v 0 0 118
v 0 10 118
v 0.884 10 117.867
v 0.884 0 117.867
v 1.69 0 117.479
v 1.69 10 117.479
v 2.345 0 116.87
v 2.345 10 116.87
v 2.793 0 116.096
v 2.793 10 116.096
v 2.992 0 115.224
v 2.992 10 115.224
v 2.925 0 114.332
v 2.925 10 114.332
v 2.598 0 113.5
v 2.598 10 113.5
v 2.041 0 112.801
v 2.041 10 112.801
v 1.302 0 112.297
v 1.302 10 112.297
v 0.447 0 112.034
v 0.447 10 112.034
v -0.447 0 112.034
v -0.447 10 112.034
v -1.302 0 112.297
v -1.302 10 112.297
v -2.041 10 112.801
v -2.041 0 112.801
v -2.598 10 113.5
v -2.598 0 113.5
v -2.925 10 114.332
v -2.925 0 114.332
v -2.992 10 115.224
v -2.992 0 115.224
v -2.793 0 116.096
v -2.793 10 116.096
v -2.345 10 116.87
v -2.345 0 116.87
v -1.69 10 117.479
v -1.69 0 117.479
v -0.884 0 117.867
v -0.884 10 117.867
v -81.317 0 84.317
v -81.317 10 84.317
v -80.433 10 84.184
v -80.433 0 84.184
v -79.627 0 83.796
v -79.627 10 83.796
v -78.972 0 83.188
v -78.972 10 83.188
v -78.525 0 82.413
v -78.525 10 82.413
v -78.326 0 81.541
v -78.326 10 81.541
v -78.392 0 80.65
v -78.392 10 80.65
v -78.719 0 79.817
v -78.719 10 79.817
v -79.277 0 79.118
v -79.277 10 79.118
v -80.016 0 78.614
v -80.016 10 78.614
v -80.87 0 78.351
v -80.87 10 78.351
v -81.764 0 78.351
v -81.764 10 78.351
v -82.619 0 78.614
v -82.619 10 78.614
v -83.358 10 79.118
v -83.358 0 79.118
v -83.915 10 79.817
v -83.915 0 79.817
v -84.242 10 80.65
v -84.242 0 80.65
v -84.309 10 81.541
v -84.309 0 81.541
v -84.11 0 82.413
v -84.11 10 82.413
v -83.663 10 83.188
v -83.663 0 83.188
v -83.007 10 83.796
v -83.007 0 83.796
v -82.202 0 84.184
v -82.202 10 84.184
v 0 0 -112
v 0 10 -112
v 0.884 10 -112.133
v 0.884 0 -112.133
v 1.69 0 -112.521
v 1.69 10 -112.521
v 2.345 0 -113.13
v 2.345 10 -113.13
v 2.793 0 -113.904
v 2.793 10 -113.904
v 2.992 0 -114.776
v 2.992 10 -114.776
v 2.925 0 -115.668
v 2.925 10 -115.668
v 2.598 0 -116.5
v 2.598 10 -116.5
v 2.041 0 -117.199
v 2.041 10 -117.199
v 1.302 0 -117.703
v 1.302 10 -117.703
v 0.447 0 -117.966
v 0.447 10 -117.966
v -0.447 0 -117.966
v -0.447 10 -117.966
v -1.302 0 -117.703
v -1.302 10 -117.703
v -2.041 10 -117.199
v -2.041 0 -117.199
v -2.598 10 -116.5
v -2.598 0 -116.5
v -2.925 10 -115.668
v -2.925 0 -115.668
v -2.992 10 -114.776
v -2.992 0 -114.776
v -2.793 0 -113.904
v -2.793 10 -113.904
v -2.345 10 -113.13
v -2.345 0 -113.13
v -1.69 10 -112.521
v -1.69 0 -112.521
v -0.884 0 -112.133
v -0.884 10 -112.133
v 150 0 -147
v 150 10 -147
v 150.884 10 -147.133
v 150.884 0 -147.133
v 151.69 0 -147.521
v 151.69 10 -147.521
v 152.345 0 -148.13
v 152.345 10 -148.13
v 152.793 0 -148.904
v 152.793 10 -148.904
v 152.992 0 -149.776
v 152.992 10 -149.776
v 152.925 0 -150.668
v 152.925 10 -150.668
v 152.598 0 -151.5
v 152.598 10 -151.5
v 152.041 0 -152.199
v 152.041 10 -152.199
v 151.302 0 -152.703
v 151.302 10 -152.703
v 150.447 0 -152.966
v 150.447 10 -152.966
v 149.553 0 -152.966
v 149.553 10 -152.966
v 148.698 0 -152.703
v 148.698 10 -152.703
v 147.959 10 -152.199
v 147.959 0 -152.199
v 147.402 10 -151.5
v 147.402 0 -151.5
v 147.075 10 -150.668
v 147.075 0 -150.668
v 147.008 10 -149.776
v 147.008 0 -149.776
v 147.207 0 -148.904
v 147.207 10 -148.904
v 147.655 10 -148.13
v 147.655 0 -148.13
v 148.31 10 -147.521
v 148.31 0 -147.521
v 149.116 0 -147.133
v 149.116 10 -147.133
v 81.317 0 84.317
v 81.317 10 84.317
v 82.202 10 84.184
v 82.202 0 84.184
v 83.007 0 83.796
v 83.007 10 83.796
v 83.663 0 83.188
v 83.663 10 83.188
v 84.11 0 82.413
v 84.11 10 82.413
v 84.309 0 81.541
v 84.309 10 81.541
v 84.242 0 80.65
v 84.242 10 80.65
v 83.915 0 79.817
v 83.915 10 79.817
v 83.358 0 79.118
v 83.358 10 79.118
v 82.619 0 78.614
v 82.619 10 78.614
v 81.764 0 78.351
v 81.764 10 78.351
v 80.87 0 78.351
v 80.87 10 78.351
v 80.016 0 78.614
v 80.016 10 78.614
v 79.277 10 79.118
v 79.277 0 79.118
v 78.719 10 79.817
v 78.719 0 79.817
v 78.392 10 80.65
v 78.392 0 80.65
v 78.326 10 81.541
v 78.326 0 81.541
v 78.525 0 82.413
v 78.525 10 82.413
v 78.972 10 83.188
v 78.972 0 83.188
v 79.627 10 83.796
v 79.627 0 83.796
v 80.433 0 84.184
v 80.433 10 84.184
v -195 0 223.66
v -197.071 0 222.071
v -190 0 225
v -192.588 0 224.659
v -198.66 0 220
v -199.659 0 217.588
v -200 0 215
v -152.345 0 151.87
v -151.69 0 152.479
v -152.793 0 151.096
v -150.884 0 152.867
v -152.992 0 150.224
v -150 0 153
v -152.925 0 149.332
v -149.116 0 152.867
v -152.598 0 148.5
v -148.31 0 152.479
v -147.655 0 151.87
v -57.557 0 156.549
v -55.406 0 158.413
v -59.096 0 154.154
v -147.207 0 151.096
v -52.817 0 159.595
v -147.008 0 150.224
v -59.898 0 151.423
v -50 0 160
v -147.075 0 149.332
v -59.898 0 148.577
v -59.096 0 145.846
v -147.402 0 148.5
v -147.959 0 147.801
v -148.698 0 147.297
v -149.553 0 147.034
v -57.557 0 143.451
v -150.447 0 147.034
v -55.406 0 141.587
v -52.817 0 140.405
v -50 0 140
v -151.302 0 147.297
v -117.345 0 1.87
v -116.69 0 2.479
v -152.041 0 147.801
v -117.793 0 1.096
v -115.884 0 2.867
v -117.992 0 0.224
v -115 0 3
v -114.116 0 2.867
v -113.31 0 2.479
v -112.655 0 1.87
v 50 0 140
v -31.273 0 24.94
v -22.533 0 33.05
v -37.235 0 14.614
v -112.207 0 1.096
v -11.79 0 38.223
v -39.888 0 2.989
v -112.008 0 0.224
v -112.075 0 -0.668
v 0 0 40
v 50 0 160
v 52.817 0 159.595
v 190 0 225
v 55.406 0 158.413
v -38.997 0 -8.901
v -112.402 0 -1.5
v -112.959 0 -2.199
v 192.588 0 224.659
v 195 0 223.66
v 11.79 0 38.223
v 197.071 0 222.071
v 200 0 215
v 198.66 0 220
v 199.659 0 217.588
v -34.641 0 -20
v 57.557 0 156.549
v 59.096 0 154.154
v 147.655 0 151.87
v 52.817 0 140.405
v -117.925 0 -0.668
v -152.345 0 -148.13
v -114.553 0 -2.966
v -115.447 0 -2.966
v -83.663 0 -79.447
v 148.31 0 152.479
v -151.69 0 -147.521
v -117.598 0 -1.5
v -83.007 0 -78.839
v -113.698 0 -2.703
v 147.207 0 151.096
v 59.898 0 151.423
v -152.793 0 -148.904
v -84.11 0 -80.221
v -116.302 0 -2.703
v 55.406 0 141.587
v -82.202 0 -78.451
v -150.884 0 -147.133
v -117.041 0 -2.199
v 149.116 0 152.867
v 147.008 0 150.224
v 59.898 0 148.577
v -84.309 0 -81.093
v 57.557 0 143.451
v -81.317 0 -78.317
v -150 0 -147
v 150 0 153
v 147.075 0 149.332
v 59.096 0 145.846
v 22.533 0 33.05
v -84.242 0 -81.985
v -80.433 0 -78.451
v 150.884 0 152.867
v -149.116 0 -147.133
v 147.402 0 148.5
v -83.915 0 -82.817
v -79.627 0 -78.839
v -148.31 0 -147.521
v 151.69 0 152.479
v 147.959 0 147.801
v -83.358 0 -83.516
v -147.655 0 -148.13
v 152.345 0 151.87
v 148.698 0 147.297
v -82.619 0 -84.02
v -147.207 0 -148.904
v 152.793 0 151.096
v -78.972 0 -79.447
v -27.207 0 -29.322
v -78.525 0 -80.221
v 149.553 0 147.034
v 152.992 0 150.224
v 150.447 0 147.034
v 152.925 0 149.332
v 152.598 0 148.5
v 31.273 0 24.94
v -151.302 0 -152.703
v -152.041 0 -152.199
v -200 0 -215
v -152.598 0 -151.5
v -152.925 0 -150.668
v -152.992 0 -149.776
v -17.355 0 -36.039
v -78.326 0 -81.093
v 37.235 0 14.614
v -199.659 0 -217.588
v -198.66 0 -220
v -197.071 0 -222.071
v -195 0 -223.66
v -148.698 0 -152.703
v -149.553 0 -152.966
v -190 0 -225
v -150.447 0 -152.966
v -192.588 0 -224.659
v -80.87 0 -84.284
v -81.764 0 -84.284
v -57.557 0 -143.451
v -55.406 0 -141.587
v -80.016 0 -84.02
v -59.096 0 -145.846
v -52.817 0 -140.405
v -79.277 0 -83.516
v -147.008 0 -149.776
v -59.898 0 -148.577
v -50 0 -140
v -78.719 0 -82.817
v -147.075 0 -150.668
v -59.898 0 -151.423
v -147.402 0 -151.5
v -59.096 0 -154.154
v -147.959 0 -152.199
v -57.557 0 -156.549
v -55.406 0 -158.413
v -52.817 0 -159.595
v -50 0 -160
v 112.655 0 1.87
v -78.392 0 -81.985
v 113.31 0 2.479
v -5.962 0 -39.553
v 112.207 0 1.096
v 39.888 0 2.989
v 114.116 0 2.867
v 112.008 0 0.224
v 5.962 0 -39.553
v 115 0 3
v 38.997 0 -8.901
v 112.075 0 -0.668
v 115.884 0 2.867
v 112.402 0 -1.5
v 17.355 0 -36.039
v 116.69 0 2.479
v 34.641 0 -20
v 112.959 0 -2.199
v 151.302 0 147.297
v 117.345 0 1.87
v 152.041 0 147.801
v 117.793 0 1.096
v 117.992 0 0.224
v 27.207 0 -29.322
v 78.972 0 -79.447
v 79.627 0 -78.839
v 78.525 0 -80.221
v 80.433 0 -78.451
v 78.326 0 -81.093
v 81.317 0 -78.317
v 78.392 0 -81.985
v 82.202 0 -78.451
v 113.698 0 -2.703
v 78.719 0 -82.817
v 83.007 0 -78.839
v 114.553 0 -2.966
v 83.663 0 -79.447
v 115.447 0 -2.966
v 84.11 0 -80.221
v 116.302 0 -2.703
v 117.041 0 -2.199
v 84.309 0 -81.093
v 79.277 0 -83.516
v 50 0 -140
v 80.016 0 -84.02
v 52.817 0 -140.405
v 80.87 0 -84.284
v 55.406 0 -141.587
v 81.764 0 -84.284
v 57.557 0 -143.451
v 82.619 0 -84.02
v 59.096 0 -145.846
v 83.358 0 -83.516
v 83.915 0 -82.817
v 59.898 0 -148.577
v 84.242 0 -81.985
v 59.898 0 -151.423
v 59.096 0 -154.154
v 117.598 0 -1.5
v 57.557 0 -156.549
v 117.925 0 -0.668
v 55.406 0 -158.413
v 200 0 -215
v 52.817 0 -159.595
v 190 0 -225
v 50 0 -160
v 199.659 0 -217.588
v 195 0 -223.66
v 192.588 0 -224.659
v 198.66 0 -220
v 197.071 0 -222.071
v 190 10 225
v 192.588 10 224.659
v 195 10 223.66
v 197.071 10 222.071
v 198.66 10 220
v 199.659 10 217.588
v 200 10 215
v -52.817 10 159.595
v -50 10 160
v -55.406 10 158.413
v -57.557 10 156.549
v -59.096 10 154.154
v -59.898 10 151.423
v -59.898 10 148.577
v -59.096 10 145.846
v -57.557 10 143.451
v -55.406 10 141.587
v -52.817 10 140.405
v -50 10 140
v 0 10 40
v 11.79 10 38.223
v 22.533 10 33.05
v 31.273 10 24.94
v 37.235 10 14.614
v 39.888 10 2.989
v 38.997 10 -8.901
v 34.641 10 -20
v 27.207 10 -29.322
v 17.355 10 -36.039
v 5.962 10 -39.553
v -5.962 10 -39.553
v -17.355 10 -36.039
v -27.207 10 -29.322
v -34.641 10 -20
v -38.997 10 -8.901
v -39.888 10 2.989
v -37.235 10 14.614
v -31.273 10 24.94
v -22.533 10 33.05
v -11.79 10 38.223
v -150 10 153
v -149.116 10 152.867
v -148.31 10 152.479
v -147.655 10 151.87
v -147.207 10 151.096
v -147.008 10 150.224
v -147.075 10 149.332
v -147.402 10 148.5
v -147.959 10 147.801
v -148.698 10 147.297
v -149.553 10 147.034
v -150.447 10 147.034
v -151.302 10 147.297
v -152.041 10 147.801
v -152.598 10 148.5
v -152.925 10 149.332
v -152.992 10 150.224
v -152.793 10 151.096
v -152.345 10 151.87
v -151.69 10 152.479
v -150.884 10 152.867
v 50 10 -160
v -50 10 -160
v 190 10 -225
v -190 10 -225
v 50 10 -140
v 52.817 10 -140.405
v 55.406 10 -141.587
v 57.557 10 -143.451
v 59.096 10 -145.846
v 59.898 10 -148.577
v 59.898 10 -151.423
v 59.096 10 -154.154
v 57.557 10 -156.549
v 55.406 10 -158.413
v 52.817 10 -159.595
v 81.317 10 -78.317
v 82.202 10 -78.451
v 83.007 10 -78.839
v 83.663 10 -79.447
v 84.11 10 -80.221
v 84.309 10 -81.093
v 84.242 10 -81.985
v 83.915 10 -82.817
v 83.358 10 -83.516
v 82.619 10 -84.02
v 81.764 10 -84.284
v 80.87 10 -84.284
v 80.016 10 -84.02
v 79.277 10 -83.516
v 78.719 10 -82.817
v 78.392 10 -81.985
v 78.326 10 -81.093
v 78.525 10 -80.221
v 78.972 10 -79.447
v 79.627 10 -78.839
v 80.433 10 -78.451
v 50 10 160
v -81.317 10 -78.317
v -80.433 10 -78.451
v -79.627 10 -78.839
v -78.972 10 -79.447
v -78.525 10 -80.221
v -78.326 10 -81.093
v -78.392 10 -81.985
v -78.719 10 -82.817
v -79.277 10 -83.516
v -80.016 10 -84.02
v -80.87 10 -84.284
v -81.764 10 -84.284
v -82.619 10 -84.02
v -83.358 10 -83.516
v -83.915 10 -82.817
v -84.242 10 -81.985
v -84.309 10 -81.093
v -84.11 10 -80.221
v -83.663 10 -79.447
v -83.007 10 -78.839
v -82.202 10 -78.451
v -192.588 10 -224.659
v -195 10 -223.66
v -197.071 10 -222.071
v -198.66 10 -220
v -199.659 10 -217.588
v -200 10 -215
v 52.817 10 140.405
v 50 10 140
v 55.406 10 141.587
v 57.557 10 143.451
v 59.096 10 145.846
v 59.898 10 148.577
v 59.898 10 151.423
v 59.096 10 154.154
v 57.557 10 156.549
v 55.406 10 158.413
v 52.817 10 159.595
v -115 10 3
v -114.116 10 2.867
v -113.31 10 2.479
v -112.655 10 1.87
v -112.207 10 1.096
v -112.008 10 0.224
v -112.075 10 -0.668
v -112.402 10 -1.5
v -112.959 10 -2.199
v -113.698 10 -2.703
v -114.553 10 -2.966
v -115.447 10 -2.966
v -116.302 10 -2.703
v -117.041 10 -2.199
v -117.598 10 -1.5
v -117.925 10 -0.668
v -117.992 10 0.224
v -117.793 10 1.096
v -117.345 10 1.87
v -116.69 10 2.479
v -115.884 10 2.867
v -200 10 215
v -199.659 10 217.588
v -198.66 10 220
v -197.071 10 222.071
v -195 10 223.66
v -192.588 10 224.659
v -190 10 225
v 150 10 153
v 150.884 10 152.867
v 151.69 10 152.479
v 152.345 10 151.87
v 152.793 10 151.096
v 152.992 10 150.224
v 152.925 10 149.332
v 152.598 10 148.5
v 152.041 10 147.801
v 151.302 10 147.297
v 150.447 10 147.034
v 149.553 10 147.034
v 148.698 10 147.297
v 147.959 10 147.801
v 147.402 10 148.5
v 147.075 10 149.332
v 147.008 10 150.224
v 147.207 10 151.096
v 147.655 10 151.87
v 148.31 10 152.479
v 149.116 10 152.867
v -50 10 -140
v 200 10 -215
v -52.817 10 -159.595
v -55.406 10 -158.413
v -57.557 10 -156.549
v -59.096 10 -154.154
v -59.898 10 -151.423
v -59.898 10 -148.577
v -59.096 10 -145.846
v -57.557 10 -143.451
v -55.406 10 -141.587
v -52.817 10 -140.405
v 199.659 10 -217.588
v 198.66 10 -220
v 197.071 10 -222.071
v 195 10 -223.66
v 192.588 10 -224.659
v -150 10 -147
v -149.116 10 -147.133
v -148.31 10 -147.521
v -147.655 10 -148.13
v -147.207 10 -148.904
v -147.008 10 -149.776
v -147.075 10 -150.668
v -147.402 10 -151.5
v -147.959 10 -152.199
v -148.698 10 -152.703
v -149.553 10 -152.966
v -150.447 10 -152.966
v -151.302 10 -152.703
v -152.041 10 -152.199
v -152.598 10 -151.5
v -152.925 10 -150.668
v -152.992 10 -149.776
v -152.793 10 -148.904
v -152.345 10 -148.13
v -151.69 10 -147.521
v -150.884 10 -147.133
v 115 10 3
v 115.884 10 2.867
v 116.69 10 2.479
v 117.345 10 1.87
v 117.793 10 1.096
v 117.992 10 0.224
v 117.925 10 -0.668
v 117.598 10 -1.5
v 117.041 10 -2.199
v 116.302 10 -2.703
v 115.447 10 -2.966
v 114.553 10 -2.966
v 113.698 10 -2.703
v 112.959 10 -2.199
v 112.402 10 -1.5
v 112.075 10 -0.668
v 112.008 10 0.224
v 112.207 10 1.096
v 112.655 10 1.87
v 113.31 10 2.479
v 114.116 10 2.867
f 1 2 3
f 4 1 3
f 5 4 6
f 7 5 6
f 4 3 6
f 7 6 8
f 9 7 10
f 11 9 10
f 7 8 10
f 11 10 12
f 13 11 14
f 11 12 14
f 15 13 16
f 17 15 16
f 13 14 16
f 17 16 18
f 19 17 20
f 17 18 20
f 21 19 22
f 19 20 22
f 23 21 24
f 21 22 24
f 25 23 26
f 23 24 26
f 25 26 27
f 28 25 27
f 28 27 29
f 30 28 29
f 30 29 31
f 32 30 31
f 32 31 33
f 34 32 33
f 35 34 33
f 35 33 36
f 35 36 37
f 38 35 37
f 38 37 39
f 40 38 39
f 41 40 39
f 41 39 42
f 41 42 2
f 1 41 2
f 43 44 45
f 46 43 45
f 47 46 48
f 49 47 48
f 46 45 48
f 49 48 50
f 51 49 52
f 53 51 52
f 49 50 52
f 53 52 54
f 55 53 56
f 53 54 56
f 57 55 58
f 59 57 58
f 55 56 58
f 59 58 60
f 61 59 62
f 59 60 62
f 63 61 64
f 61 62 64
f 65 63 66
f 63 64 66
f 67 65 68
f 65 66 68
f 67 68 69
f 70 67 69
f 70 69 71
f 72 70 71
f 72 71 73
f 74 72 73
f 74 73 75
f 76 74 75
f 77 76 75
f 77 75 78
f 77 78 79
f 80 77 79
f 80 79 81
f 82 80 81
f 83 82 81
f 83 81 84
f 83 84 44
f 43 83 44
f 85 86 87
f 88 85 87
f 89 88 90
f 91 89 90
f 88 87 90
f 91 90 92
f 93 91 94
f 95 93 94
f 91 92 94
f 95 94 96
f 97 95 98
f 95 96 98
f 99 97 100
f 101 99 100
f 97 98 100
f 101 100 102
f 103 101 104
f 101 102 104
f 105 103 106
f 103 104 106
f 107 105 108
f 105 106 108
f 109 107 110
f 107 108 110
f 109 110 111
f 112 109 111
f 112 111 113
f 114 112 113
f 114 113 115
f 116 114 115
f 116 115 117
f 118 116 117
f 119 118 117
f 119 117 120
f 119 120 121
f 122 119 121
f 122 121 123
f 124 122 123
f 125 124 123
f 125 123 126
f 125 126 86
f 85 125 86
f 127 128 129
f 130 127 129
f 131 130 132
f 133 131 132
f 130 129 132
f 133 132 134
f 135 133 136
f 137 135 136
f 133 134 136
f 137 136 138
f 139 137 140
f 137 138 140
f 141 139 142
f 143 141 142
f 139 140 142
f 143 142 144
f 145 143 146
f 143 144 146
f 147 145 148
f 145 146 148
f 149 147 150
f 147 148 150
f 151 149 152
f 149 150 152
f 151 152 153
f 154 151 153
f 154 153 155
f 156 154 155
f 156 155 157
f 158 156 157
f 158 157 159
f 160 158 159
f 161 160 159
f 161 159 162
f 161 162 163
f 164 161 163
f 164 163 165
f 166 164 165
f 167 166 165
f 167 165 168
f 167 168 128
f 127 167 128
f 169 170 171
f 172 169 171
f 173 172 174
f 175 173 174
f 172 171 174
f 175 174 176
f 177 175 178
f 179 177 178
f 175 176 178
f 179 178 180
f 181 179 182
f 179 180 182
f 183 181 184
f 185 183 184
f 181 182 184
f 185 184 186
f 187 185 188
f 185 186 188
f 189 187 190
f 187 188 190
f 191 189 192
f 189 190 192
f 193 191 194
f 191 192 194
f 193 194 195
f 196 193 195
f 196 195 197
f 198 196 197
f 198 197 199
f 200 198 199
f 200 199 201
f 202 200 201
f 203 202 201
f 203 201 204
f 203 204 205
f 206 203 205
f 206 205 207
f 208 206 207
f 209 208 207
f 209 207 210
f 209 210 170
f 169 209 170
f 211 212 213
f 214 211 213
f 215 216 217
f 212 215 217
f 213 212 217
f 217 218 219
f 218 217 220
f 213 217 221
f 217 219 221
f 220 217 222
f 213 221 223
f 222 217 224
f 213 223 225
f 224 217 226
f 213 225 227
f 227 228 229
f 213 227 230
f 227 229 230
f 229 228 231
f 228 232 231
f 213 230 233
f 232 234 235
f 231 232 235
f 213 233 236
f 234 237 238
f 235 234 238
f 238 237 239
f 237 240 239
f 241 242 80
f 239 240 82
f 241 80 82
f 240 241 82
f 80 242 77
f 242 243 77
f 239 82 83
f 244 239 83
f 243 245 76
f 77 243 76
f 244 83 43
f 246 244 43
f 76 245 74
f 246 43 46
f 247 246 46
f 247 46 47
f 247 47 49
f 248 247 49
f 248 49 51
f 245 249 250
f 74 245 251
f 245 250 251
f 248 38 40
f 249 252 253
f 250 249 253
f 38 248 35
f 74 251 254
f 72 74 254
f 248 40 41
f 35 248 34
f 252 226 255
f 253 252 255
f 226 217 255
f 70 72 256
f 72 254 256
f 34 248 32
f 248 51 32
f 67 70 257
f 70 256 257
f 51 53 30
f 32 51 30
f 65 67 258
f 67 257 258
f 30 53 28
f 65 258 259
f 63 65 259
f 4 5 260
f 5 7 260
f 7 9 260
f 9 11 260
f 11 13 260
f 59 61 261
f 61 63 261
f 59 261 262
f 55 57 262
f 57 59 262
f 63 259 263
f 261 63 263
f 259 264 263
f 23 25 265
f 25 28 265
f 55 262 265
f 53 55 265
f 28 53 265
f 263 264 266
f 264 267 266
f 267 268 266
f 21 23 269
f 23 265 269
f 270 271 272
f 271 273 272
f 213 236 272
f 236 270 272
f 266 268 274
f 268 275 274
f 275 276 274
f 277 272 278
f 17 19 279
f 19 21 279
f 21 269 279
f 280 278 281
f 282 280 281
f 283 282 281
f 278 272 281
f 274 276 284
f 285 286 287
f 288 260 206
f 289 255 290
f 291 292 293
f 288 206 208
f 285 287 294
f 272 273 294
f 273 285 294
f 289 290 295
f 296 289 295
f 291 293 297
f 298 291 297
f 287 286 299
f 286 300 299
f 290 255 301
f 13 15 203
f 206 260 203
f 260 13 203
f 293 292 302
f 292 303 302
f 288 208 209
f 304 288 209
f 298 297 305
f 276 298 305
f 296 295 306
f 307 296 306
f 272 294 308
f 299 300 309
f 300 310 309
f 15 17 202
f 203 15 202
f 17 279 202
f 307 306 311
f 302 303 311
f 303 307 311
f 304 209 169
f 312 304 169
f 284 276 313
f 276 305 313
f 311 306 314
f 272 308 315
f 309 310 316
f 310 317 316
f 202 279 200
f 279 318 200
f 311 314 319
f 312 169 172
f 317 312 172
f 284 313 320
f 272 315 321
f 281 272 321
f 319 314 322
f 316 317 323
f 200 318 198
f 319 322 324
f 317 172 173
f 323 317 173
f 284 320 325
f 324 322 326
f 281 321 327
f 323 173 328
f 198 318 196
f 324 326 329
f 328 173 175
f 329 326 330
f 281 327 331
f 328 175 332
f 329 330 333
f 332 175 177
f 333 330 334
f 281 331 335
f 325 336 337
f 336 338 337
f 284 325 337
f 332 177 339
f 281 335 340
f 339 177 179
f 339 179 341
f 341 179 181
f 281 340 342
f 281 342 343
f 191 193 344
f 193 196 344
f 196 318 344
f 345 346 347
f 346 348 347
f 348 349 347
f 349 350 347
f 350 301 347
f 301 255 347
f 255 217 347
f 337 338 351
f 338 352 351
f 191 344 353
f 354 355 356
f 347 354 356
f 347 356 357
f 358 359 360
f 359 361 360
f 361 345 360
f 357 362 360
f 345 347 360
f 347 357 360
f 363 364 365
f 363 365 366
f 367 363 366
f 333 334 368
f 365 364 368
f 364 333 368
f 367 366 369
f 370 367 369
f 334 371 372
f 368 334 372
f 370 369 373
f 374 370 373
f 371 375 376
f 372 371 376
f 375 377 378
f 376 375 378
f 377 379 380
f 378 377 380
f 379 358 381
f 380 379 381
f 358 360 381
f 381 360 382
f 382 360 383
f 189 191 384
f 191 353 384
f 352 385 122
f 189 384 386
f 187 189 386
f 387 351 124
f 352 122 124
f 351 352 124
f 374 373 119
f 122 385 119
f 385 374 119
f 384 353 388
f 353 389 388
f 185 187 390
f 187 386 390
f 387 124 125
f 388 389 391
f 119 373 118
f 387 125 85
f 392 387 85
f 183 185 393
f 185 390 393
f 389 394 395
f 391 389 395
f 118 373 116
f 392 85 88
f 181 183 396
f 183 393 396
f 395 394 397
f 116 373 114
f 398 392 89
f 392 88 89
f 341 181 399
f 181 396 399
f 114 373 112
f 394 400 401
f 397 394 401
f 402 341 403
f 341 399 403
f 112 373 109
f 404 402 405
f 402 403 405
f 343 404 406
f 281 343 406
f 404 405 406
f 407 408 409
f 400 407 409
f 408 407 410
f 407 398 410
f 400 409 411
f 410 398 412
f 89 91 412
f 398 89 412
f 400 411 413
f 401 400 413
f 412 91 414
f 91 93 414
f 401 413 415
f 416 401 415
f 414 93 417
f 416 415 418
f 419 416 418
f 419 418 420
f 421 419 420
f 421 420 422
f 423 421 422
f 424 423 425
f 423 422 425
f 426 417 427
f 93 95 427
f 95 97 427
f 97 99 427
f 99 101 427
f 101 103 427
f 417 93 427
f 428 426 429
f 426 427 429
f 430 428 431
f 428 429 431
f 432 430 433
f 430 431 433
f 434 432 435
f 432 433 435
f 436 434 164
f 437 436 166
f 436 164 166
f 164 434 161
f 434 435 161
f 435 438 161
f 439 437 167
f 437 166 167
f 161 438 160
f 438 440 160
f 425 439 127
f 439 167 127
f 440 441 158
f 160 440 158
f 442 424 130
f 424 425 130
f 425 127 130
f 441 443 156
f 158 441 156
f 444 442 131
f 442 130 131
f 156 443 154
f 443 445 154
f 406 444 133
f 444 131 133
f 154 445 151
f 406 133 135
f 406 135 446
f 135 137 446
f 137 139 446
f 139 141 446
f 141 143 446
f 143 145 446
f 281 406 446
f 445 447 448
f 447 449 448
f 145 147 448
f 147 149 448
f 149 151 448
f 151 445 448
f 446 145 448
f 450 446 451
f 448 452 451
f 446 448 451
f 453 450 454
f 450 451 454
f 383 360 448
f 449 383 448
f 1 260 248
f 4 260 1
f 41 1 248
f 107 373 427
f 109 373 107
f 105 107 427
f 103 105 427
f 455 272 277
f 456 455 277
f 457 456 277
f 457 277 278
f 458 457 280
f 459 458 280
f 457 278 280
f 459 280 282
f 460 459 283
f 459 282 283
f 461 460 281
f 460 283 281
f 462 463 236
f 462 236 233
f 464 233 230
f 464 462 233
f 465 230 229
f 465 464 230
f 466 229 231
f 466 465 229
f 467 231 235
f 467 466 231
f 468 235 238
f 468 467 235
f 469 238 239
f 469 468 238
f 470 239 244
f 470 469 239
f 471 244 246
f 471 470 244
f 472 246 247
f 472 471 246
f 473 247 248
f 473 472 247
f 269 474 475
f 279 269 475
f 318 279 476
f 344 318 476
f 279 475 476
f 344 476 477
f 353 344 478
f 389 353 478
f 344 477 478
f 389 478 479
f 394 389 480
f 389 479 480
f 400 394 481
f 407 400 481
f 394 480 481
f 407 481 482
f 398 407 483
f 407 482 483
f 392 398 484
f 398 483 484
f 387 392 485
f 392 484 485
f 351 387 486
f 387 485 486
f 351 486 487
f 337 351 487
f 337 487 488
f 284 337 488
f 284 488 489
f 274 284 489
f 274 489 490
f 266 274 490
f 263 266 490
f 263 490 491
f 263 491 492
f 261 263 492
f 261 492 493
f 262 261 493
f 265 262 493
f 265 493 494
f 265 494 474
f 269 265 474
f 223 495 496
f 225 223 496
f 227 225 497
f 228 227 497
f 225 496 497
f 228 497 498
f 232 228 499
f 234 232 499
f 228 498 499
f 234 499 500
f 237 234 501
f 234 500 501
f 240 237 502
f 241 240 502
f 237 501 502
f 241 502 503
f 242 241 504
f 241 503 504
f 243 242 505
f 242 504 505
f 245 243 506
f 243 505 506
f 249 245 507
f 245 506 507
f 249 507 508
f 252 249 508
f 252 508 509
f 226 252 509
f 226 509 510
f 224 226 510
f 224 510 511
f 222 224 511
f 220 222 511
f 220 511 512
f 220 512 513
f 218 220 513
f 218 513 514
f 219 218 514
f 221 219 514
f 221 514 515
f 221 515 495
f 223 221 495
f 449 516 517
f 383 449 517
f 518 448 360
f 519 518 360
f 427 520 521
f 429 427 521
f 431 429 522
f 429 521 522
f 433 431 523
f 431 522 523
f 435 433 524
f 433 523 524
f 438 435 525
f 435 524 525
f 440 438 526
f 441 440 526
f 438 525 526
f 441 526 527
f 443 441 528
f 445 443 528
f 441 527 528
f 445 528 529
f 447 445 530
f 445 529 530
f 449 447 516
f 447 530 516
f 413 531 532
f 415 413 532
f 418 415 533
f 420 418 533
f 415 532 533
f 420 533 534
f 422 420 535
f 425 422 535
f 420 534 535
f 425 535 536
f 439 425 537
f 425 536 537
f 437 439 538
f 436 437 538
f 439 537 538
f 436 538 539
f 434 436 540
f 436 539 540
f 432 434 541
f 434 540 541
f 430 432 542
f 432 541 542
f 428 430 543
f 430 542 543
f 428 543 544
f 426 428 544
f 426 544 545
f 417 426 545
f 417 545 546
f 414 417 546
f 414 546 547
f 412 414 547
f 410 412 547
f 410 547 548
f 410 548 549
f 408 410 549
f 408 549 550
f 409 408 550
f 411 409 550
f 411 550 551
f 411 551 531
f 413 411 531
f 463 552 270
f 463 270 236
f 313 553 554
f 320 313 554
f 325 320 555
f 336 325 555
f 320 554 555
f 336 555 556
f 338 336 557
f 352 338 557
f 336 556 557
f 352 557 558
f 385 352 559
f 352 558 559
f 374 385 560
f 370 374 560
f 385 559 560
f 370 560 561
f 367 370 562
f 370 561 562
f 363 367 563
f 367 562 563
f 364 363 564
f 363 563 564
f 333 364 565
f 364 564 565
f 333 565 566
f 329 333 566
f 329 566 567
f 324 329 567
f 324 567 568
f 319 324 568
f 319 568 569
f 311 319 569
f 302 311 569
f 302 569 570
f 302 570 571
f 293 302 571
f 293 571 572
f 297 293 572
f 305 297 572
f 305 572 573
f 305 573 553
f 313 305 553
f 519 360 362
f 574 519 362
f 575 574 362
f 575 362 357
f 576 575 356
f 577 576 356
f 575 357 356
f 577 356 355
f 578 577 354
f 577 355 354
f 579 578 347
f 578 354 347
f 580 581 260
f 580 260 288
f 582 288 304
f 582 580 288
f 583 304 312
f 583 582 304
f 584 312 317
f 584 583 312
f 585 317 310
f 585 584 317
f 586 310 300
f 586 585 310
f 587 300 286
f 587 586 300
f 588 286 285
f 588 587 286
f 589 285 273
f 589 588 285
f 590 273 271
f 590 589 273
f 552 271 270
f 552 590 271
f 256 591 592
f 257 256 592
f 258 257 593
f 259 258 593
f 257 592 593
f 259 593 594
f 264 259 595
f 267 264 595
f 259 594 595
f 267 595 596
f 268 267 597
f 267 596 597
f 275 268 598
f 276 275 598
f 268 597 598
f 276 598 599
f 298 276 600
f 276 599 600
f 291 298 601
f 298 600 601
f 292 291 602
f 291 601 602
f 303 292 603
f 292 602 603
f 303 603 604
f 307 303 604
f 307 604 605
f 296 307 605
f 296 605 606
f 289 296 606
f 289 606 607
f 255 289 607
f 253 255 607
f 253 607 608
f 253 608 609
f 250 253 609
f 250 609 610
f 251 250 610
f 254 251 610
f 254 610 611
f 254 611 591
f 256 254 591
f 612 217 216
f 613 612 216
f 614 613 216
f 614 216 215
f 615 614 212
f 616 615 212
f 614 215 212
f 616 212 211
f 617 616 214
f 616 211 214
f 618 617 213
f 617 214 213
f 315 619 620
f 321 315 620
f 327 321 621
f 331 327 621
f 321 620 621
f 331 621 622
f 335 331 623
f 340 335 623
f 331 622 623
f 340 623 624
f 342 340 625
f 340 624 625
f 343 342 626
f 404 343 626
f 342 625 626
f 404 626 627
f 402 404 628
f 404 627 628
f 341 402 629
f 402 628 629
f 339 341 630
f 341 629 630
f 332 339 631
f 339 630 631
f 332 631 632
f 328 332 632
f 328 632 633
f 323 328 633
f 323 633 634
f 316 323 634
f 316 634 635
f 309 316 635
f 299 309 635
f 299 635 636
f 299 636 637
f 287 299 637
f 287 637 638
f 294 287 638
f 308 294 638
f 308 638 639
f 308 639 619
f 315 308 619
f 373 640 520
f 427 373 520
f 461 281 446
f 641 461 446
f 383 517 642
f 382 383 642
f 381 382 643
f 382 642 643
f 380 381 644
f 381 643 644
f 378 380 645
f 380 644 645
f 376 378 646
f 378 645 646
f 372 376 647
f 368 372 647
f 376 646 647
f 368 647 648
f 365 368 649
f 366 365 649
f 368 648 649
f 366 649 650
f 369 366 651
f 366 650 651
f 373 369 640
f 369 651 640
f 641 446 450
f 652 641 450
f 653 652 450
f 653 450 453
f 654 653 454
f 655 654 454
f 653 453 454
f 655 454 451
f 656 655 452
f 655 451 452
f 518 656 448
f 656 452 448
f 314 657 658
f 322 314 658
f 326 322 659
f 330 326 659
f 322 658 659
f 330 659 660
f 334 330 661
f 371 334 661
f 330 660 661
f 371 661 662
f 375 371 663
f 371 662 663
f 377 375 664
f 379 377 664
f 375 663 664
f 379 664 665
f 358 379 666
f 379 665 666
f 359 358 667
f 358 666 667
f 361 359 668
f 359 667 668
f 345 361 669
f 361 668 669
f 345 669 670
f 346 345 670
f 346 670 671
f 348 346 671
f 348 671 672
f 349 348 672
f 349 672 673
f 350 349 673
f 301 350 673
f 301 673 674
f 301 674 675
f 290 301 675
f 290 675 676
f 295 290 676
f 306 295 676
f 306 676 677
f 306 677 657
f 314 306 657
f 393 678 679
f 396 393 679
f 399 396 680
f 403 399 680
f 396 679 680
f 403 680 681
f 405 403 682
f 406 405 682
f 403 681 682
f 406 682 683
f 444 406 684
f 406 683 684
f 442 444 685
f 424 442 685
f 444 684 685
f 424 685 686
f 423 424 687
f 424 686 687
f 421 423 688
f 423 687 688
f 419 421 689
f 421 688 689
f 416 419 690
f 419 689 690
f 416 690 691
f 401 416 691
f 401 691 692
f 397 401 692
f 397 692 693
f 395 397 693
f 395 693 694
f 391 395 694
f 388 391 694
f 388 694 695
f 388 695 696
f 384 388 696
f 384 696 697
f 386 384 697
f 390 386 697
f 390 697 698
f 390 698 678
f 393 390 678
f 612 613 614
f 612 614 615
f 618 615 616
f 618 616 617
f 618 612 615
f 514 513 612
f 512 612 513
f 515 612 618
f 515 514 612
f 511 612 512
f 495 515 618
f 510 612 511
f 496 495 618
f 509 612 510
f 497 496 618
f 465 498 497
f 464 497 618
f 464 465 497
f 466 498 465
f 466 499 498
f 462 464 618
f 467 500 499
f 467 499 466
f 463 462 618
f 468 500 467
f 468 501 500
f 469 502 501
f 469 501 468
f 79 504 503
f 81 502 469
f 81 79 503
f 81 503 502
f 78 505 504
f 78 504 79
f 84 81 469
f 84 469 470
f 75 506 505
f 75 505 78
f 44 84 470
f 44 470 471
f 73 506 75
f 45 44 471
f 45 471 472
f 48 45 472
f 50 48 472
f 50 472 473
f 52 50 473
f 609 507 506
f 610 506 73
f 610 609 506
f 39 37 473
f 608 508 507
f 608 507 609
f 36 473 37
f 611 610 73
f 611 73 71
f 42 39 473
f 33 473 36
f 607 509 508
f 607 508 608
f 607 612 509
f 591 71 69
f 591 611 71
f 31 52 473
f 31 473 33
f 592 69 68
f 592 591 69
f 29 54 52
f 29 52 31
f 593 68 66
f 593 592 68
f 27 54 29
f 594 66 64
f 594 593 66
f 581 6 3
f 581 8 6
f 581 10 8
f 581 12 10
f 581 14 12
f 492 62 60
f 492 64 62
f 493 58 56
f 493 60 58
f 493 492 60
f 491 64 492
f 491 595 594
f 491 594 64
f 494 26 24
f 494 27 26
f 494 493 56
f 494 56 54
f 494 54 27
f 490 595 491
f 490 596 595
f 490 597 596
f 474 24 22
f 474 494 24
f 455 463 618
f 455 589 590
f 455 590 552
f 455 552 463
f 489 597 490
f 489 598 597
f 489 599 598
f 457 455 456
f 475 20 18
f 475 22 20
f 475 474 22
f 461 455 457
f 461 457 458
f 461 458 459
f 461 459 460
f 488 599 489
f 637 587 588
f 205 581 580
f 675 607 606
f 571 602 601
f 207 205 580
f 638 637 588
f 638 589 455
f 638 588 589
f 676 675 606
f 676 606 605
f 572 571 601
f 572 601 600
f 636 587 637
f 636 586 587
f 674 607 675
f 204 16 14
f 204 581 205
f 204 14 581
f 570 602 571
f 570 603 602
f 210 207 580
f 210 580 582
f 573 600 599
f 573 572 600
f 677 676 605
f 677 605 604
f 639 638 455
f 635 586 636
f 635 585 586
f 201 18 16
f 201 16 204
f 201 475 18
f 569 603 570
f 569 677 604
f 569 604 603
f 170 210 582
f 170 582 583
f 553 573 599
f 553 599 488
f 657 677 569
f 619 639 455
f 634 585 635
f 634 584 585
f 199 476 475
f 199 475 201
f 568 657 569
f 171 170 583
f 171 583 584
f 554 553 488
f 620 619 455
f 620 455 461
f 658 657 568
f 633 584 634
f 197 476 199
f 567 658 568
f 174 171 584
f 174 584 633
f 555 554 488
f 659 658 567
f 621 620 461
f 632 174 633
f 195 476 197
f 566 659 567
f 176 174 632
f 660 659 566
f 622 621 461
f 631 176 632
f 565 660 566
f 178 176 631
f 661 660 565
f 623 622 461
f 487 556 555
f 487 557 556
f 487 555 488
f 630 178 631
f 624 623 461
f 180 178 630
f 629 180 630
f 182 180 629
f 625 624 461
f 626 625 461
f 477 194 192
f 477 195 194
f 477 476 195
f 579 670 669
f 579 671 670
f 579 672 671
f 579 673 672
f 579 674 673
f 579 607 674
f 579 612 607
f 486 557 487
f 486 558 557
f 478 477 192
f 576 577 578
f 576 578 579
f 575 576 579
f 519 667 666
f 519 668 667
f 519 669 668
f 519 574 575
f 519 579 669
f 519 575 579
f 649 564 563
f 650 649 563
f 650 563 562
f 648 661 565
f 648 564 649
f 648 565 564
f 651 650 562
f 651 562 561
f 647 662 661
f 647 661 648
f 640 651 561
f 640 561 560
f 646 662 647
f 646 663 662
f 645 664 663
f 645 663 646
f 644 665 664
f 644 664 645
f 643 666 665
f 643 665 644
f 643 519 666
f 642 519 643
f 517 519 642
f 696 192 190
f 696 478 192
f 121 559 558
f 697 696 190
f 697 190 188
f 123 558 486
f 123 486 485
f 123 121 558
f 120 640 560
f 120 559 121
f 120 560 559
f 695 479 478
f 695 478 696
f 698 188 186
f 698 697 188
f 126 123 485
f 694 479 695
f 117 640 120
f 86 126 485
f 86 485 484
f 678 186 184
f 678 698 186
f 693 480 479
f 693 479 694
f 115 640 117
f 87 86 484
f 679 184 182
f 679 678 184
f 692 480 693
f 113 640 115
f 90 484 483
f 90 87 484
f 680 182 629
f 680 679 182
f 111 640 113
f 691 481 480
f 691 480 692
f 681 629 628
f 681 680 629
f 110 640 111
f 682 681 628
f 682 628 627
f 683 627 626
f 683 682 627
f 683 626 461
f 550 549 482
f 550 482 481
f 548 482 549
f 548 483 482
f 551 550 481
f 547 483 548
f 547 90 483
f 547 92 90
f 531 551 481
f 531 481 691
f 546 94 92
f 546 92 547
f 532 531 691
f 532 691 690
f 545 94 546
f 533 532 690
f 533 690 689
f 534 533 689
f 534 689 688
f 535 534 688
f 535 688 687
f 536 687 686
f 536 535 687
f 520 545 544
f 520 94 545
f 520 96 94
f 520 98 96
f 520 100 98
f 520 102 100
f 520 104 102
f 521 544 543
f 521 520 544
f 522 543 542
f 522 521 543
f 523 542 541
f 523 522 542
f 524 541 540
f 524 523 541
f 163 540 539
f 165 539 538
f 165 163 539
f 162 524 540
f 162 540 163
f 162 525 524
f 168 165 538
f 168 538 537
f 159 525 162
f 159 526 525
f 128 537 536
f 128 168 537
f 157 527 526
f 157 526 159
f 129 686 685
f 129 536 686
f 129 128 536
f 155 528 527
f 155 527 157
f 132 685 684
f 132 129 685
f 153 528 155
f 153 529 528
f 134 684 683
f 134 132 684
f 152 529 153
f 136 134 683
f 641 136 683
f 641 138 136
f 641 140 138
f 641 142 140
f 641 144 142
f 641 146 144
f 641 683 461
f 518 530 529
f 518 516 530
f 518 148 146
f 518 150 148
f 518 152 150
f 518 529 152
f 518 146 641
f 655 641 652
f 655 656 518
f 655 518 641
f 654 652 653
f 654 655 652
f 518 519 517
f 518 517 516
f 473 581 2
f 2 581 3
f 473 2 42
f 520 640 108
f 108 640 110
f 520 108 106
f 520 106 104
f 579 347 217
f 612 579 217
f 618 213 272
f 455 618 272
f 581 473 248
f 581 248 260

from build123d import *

# Parameters (mm, degrees)
EXTRUDE_1_DEPTH     = 10
SKETCH_3_R          = 40
SKETCH_3_R_2        = 3
CUT_EXTRUDE_1_DEPTH = 15


with BuildPart() as part:
    # 草圖1 → 填料-伸長1 (new body)
    with BuildSketch(Plane(origin=(0, 0, 0), x_dir=(1, 0, 0), z_dir=(0, 1, 0))):
        with BuildLine():
            Line((-200, 215), (-200, -215))
            ThreePointArc((-200, -215), (-197.071067812, -222.071067812), (-190, -225))
            Line((-190, -225), (190, -225))
            ThreePointArc((190, -225), (197.071067812, -222.071067812), (200, -215))
            Line((200, -215), (200, 215))
            ThreePointArc((200, 215), (197.071067812, 222.071067812), (190, 225))
            Line((190, 225), (-190, 225))
            ThreePointArc((-190, 225), (-197.071067812, 222.071067812), (-200, 215))
        make_face()
    extrude(amount=EXTRUDE_1_DEPTH)

    # 草圖3 → 除料-伸長1 (cut)
    with BuildSketch(Plane(origin=(0, 10, 0), x_dir=(1, 0, 0), z_dir=(0, 1, 0))):
        with Locations(Location((0, 0, 0), (0, 0, 270))):
            Circle(SKETCH_3_R)
        with Locations(Location((0, 115, 0), (0, 0, 270))):
            Circle(SKETCH_3_R_2)
        with Locations(Location((81.317279836, 81.317279836, 0), (0, 0, 270))):
            Circle(SKETCH_3_R_2)
        with Locations(Location((115, 0, 0), (0, 0, 270))):
            Circle(SKETCH_3_R_2)
        with Locations(Location((81.317279836, -81.317279836, 0), (0, 0, 270))):
            Circle(SKETCH_3_R_2)
        with Locations(Location((0, -115, 0), (0, 0, 270))):
            Circle(SKETCH_3_R_2)
        with Locations(Location((-81.317279836, -81.317279836, 0), (0, 0, 270))):
            Circle(SKETCH_3_R_2)
        with Locations(Location((-115, 0, 0), (0, 0, 270))):
            Circle(SKETCH_3_R_2)
        with Locations(Location((-81.317279836, 81.317279836, 0), (0, 0, 270))):
            Circle(SKETCH_3_R_2)
        with Locations(Location((-150, 150, 0), (0, 0, 270))):
            Circle(SKETCH_3_R_2)
        with Locations(Location((150, 150, 0), (0, 0, 270))):
            Circle(SKETCH_3_R_2)
        with Locations(Location((-150, -150, 0), (0, 0, 270))):
            Circle(SKETCH_3_R_2)
        with Locations(Location((150, -150, 0), (0, 0, 270))):
            Circle(SKETCH_3_R_2)
        with BuildLine():
            Line((-50, -140), (50, -140))
            ThreePointArc((50, -140), (60, -150), (50, -160))
            Line((50, -160), (-50, -160))
            ThreePointArc((-50, -160), (-60, -150), (-50, -140))
        make_face()
        with BuildLine():
            Line((-50, 140), (50, 140))
            ThreePointArc((50, 140), (60, 150), (50, 160))
            Line((50, 160), (-50, 160))
            ThreePointArc((-50, 160), (-60, 150), (-50, 140))
        make_face()
    extrude(amount=-CUT_EXTRUDE_1_DEPTH, mode=Mode.SUBTRACT)


solid = part.part
